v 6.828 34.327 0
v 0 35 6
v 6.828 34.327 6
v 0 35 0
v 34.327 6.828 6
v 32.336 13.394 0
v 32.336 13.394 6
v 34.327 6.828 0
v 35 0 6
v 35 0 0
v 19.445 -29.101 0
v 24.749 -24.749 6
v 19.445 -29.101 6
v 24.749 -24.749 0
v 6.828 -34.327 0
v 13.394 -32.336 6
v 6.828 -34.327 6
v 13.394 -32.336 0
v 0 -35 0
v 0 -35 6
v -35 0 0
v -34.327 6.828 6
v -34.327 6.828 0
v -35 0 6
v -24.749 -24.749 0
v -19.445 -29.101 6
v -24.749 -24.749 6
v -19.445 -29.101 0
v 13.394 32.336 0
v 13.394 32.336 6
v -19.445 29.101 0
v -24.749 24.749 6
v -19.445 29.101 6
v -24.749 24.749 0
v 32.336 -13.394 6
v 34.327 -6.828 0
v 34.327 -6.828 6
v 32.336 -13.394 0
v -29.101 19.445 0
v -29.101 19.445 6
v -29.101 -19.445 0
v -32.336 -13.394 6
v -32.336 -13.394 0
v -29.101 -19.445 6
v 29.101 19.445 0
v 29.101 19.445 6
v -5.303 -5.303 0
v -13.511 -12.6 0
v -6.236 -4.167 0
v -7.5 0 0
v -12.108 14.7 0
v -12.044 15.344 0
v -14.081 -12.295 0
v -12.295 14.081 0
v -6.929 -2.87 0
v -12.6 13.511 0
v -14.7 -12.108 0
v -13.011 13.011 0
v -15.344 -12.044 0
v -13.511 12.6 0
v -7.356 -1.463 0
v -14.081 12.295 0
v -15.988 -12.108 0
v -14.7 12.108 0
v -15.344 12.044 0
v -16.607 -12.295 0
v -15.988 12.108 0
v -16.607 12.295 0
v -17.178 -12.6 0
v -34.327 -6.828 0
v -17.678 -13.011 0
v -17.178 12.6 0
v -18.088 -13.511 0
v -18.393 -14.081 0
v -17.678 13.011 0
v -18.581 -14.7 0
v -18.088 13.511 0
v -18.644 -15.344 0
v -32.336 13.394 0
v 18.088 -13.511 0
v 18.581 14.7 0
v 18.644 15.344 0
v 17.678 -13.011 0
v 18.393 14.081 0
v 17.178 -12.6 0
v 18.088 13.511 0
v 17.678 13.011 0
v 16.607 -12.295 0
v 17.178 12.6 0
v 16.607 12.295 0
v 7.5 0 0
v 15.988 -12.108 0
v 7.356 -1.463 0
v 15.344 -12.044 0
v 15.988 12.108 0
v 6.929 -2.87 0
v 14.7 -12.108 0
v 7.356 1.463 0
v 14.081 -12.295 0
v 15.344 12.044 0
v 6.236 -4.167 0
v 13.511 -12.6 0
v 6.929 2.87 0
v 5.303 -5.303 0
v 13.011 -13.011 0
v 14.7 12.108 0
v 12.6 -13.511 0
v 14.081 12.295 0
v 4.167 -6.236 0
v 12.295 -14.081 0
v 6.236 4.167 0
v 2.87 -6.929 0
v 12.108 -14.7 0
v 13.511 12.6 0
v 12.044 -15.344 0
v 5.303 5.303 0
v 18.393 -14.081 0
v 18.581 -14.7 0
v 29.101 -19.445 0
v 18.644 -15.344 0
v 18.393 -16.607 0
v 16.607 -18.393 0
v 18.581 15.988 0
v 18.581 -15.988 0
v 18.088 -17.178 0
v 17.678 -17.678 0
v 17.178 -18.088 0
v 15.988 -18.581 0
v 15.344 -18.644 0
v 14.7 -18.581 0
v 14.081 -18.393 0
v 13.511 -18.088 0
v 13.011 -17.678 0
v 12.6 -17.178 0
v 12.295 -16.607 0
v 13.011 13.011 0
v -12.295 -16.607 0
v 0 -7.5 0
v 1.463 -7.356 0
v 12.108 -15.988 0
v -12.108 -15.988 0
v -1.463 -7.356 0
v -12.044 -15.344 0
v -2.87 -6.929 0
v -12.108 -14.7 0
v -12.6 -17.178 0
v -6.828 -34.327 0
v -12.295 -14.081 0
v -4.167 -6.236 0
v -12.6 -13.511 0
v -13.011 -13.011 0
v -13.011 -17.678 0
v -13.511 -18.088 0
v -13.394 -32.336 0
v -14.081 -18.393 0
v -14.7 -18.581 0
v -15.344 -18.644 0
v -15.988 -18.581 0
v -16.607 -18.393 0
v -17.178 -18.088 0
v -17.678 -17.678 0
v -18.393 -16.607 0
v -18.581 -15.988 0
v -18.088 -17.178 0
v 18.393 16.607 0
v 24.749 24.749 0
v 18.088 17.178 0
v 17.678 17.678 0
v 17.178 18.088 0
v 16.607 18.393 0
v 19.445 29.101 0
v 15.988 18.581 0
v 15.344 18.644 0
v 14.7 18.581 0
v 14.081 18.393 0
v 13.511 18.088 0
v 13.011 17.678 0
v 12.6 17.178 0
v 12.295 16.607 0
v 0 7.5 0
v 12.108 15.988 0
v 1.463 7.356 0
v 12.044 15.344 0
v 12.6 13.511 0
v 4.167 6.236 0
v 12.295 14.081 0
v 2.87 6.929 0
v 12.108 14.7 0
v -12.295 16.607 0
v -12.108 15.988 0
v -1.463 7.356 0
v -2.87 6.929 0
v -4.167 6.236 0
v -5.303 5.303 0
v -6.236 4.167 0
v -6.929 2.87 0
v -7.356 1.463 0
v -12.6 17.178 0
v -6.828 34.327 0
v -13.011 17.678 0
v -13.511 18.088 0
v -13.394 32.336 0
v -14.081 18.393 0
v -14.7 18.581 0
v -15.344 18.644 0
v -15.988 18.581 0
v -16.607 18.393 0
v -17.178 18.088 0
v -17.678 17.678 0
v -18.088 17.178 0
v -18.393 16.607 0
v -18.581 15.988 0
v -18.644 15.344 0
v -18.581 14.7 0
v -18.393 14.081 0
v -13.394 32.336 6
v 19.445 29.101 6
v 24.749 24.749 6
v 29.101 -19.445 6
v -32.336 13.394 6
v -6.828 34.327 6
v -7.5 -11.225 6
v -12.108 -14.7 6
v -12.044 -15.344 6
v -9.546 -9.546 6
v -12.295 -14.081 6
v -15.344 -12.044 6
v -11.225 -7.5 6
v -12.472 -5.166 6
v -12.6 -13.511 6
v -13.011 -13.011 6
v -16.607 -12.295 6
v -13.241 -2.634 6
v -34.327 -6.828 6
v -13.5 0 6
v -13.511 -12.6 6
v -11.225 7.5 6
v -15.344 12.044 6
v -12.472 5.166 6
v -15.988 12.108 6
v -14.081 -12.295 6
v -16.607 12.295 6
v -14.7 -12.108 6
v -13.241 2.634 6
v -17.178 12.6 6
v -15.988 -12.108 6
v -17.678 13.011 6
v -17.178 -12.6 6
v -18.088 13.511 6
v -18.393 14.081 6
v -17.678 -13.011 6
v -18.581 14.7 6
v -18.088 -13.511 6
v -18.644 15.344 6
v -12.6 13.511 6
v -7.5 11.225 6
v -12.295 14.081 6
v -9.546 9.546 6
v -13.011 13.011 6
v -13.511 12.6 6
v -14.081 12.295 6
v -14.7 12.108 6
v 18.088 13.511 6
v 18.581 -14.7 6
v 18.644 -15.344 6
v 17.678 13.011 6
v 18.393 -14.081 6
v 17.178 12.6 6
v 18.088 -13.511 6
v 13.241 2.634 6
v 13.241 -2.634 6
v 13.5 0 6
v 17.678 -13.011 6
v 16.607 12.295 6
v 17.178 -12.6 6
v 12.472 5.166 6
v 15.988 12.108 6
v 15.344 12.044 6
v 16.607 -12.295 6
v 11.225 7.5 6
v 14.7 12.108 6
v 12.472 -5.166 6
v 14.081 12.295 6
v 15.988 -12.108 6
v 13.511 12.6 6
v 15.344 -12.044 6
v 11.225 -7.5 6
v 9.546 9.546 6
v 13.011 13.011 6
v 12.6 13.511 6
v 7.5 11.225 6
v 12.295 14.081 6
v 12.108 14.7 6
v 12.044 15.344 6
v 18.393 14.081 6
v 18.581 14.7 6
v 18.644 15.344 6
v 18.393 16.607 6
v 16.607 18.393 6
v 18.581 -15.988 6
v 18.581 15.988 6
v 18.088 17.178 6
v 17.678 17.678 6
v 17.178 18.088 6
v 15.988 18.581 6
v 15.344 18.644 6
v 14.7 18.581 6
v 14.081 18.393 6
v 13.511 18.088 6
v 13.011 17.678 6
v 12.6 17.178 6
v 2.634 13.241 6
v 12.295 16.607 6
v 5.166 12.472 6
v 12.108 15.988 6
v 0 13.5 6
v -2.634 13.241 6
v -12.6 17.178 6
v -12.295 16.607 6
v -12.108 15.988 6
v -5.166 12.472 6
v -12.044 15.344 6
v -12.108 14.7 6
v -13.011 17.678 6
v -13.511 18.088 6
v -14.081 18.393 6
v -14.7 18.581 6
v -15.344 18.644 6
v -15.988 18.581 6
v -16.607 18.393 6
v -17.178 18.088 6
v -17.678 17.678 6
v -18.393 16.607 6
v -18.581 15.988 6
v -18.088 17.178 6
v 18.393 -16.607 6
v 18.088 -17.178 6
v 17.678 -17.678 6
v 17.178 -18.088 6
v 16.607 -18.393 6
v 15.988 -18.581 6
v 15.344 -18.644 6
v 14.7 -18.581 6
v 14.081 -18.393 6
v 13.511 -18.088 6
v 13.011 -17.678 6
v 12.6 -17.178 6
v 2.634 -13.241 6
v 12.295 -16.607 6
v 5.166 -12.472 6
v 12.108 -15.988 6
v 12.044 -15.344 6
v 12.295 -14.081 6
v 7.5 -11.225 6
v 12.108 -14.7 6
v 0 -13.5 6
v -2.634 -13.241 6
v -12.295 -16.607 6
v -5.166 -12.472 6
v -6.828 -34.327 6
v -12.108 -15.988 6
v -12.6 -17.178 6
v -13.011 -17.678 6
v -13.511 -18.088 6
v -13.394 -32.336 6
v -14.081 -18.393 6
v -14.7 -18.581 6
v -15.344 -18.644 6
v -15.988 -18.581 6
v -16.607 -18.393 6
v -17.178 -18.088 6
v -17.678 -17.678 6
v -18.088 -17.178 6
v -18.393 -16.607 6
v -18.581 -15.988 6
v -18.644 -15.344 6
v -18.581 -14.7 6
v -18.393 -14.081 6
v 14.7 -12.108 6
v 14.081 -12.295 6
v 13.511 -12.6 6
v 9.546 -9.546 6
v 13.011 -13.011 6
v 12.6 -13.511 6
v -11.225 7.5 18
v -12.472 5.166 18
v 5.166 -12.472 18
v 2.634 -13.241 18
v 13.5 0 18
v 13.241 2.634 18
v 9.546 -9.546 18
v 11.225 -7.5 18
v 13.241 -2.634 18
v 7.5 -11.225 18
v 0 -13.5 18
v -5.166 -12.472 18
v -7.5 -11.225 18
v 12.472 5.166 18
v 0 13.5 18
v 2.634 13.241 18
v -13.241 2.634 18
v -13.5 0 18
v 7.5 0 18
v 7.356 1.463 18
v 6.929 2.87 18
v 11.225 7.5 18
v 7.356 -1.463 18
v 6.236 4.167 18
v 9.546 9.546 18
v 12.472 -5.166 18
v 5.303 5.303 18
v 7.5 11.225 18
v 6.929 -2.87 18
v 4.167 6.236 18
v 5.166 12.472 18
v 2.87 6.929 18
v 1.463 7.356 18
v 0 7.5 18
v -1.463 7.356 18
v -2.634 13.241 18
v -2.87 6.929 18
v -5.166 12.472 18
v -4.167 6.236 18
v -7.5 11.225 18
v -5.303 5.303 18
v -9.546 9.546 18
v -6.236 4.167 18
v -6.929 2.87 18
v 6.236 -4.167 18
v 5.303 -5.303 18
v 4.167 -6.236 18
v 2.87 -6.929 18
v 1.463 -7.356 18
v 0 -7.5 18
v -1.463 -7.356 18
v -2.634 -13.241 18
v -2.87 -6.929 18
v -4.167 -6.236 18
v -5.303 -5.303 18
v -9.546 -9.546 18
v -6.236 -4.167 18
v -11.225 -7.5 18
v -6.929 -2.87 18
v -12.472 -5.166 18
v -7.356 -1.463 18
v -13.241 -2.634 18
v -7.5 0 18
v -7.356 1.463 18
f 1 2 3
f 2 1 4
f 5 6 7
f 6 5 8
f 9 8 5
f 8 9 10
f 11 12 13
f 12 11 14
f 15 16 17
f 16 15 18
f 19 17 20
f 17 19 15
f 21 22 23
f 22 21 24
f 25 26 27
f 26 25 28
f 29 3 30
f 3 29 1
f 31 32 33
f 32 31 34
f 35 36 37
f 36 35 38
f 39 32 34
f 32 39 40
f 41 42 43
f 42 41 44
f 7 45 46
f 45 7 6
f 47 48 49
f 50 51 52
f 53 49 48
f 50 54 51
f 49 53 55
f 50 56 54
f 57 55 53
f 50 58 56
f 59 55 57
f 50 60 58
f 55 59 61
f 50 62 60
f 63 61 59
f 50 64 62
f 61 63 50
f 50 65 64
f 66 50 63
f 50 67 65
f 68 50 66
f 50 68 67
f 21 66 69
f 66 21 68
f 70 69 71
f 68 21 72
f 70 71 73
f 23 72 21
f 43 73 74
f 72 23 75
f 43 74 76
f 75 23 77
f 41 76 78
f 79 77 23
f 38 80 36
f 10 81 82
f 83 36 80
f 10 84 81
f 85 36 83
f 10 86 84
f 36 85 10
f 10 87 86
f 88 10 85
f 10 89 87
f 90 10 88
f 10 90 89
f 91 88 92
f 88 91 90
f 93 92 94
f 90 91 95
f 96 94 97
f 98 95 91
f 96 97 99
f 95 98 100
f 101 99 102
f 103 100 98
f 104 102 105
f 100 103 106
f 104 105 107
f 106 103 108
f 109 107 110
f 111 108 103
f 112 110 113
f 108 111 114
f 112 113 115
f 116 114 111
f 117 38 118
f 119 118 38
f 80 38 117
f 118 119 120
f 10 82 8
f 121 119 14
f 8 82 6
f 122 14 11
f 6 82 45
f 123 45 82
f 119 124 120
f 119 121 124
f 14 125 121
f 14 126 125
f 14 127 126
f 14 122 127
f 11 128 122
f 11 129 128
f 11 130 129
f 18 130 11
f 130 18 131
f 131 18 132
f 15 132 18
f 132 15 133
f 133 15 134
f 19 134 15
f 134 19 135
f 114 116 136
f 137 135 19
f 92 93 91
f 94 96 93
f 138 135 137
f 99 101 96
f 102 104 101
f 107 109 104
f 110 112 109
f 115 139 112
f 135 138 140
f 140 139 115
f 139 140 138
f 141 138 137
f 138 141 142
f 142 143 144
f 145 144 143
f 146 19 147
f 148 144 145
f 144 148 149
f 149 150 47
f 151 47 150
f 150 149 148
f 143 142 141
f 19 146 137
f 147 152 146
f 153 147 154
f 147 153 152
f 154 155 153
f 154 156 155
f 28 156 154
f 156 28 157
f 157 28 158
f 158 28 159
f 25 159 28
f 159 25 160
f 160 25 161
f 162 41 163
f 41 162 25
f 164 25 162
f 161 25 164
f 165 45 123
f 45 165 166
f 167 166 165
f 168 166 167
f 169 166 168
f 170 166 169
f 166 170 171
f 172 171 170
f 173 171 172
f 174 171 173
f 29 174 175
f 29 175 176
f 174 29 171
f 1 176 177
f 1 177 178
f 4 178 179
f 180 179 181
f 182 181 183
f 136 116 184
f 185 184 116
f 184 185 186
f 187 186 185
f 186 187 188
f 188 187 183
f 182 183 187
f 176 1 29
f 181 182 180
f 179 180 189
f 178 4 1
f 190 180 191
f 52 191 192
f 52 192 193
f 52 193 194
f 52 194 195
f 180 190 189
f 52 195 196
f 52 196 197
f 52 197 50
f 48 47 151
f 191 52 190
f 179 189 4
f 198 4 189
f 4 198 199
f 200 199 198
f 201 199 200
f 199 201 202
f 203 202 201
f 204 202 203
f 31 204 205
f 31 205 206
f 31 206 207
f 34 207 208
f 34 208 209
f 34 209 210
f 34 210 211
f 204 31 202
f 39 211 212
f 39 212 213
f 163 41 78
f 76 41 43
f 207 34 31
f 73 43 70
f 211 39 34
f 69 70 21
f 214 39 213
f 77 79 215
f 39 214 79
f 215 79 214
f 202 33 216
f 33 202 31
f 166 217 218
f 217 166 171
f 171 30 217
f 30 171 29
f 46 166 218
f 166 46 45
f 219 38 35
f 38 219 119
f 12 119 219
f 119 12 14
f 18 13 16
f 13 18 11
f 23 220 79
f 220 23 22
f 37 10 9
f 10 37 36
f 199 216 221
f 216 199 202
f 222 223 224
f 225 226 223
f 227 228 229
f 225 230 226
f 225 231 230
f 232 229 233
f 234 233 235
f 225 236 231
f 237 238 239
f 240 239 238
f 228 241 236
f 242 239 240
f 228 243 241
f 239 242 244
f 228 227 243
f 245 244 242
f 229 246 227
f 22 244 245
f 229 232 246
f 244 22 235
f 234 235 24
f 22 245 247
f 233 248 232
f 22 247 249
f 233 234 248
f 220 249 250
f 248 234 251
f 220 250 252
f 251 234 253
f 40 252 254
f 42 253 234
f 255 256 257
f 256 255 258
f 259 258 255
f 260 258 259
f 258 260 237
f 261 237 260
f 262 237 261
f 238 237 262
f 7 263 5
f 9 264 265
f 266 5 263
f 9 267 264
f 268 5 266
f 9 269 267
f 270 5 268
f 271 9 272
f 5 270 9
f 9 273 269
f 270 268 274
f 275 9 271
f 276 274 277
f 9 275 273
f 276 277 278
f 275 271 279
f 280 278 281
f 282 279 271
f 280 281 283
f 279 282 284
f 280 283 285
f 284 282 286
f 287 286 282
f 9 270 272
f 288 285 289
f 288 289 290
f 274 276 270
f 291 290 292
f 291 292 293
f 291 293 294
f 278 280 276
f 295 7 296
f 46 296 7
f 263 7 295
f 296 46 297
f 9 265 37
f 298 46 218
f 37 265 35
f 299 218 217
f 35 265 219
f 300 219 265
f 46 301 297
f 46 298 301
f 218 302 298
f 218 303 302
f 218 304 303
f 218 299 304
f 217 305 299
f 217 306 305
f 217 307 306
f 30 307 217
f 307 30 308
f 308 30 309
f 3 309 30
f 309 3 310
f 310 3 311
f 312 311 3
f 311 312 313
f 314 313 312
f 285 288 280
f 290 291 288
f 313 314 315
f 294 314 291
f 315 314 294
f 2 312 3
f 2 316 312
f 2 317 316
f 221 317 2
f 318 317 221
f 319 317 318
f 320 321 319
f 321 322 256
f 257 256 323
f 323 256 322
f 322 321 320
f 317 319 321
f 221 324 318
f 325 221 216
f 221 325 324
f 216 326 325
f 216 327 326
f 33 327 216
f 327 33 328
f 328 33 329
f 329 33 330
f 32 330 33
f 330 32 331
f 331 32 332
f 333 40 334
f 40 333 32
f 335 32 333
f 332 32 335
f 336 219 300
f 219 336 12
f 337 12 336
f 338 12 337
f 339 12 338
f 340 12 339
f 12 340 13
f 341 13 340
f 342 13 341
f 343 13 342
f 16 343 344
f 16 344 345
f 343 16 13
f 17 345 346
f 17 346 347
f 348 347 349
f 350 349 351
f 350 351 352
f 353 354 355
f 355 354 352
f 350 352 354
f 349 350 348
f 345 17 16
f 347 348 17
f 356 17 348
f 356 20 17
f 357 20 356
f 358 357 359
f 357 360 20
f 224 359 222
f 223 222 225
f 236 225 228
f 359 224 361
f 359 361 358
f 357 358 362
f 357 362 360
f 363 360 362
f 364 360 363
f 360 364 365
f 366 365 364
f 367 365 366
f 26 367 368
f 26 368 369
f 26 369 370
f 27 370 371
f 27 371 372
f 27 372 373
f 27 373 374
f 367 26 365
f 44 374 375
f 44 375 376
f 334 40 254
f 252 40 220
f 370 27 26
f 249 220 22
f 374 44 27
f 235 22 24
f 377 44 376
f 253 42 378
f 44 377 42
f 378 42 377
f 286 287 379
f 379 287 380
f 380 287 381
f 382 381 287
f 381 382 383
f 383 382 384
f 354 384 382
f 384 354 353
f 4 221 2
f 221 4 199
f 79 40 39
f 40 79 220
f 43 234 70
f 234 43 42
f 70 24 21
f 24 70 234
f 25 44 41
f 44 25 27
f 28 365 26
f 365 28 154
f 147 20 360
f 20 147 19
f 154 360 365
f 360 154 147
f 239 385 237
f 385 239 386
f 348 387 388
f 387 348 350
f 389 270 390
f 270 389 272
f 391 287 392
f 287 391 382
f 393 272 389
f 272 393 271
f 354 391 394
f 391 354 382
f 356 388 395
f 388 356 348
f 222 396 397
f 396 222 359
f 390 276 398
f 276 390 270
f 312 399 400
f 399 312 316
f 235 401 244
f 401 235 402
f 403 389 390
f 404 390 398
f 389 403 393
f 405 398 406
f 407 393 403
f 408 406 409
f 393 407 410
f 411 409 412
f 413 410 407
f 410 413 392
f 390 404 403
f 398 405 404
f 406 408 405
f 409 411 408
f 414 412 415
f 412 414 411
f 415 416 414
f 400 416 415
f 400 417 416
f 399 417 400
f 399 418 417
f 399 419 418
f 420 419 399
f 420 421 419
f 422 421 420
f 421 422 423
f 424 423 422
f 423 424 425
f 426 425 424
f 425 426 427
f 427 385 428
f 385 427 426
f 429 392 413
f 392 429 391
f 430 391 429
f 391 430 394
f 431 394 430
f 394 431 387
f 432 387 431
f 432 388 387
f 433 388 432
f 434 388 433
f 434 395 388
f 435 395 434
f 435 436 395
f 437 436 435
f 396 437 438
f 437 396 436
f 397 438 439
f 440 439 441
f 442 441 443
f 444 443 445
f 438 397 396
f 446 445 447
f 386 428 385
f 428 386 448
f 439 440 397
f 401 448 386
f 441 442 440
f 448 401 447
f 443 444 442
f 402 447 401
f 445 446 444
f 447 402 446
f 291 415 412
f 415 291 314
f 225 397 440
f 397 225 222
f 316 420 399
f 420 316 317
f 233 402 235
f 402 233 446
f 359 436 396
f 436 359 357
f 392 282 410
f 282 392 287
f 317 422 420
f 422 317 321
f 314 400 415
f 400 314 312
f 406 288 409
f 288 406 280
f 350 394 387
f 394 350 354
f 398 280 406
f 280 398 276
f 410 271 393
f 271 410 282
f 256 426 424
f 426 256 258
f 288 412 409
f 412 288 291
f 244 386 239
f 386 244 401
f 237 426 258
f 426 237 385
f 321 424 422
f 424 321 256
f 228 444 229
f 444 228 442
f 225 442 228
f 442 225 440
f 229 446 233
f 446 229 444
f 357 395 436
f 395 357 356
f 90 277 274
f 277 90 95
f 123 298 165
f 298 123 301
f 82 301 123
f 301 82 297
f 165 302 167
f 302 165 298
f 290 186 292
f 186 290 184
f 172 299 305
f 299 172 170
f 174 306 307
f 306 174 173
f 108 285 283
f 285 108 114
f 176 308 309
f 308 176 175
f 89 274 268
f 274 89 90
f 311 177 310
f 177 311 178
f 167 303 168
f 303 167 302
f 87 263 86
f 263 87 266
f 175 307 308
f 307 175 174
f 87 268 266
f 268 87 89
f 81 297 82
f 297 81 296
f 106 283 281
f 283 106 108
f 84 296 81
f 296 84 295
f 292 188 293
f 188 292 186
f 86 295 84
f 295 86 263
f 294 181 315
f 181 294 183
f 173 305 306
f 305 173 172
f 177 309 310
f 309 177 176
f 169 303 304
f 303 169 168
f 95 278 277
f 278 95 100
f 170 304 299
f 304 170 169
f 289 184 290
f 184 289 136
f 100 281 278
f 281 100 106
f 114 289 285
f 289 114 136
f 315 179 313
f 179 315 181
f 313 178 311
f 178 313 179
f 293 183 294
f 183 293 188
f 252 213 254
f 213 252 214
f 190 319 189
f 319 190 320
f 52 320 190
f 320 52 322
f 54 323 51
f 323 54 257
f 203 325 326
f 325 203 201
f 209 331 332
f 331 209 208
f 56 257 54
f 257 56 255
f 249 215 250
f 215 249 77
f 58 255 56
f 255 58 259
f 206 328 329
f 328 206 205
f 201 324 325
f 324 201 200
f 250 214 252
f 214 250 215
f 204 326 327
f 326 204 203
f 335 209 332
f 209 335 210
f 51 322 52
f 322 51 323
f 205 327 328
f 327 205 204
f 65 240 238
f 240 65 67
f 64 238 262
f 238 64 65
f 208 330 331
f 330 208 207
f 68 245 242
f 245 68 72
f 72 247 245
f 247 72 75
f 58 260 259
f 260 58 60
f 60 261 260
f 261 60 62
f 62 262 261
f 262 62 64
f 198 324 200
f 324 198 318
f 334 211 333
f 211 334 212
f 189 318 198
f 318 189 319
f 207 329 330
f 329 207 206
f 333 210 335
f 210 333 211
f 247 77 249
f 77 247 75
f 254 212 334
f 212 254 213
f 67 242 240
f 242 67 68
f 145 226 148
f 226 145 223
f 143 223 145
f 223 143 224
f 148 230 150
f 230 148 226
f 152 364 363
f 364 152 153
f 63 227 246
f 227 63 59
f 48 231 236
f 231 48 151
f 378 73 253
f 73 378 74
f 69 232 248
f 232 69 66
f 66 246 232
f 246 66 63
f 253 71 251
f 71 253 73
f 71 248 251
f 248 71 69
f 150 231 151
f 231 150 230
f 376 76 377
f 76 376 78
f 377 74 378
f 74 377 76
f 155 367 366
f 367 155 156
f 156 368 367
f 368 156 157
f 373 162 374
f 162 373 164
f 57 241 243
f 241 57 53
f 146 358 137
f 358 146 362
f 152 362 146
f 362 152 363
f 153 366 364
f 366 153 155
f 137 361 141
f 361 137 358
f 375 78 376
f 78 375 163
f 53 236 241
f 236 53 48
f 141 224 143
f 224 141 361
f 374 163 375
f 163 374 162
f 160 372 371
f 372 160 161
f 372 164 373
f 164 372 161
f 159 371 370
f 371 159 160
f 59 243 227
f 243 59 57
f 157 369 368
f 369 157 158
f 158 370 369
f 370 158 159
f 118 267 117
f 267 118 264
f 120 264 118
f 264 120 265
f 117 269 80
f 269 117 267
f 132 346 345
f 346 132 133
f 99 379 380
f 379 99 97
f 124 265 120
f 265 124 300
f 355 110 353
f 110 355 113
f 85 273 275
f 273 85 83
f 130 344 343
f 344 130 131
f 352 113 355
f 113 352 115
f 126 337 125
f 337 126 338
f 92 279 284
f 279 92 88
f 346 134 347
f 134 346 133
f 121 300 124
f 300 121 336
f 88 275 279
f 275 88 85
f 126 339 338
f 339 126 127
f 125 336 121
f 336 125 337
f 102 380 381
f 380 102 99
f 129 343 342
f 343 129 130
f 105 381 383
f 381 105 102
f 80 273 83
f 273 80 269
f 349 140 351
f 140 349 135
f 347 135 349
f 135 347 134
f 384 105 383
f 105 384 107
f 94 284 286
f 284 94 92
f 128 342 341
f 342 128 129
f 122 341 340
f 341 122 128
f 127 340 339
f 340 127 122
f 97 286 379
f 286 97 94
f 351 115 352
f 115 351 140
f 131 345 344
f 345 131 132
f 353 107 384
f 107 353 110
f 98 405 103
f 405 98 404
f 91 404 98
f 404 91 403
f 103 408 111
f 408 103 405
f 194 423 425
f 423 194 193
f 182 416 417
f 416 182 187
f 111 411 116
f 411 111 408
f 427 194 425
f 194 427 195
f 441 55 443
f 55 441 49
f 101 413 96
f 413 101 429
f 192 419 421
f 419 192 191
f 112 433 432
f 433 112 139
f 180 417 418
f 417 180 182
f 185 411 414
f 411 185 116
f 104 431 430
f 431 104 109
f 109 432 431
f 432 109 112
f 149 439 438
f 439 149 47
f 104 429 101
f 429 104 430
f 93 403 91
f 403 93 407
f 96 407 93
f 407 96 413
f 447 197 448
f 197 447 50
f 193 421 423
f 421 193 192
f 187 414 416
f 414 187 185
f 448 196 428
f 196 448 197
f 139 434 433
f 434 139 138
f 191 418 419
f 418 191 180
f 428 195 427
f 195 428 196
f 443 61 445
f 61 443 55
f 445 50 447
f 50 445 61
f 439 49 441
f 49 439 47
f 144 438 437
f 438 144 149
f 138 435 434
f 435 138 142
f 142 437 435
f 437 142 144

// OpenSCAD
$fn = 32;

// ----------------------------------------------------------------------
// Flange Ø70 x 6
// 4 holes on a Ø43.4 bolt circle, bolted joints
// ----------------------------------------------------------------------

// --- parameters (mm) ---
flange_d = 70;   // outside diameter of the flange
thickness = 6;   // flange thickness
holes = 4;       // number of bolt holes
pcd = 43.4;      // bolt circle diameter
start_deg = 45;  // angle of the first hole, from +X
hole_d = 6.6;    // bolt hole diameter
bore_d = 15;     // central through bore
hub_d = 27;      // hub outside diameter
hub_h = 12;      // hub height above the flange face (0 = no hub)

// --- derived feature positions (mm) ---
height = thickness + hub_h;  // = 18   overall height of the part
pcd_r = pcd / 2;             // = 21.7   bolt circle radius
hole_step = 360 / holes;     // = 90   angular pitch
feature_centers = [
  [pcd_r * cos(start_deg + 0 * hole_step), pcd_r * sin(start_deg + 0 * hole_step)],
  [pcd_r * cos(start_deg + 1 * hole_step), pcd_r * sin(start_deg + 1 * hole_step)],
  [pcd_r * cos(start_deg + 2 * hole_step), pcd_r * sin(start_deg + 2 * hole_step)],
  [pcd_r * cos(start_deg + 3 * hole_step), pcd_r * sin(start_deg + 3 * hole_step)]
];   // bolt hole centres on the pitch circle

// flange disc, every hole and the bore cut straight through
difference() {
  union() {
    cylinder(d = flange_d, h = thickness);
    cylinder(d = hub_d, h = height);  // hub, overlapped into the flange
  }
  translate([0, 0, -1]) cylinder(d = bore_d, h = height + 2);  // bore, through
  for (centre = feature_centers)
    translate([centre[0], centre[1], -1]) cylinder(d = hole_d, h = thickness + 2);
}
